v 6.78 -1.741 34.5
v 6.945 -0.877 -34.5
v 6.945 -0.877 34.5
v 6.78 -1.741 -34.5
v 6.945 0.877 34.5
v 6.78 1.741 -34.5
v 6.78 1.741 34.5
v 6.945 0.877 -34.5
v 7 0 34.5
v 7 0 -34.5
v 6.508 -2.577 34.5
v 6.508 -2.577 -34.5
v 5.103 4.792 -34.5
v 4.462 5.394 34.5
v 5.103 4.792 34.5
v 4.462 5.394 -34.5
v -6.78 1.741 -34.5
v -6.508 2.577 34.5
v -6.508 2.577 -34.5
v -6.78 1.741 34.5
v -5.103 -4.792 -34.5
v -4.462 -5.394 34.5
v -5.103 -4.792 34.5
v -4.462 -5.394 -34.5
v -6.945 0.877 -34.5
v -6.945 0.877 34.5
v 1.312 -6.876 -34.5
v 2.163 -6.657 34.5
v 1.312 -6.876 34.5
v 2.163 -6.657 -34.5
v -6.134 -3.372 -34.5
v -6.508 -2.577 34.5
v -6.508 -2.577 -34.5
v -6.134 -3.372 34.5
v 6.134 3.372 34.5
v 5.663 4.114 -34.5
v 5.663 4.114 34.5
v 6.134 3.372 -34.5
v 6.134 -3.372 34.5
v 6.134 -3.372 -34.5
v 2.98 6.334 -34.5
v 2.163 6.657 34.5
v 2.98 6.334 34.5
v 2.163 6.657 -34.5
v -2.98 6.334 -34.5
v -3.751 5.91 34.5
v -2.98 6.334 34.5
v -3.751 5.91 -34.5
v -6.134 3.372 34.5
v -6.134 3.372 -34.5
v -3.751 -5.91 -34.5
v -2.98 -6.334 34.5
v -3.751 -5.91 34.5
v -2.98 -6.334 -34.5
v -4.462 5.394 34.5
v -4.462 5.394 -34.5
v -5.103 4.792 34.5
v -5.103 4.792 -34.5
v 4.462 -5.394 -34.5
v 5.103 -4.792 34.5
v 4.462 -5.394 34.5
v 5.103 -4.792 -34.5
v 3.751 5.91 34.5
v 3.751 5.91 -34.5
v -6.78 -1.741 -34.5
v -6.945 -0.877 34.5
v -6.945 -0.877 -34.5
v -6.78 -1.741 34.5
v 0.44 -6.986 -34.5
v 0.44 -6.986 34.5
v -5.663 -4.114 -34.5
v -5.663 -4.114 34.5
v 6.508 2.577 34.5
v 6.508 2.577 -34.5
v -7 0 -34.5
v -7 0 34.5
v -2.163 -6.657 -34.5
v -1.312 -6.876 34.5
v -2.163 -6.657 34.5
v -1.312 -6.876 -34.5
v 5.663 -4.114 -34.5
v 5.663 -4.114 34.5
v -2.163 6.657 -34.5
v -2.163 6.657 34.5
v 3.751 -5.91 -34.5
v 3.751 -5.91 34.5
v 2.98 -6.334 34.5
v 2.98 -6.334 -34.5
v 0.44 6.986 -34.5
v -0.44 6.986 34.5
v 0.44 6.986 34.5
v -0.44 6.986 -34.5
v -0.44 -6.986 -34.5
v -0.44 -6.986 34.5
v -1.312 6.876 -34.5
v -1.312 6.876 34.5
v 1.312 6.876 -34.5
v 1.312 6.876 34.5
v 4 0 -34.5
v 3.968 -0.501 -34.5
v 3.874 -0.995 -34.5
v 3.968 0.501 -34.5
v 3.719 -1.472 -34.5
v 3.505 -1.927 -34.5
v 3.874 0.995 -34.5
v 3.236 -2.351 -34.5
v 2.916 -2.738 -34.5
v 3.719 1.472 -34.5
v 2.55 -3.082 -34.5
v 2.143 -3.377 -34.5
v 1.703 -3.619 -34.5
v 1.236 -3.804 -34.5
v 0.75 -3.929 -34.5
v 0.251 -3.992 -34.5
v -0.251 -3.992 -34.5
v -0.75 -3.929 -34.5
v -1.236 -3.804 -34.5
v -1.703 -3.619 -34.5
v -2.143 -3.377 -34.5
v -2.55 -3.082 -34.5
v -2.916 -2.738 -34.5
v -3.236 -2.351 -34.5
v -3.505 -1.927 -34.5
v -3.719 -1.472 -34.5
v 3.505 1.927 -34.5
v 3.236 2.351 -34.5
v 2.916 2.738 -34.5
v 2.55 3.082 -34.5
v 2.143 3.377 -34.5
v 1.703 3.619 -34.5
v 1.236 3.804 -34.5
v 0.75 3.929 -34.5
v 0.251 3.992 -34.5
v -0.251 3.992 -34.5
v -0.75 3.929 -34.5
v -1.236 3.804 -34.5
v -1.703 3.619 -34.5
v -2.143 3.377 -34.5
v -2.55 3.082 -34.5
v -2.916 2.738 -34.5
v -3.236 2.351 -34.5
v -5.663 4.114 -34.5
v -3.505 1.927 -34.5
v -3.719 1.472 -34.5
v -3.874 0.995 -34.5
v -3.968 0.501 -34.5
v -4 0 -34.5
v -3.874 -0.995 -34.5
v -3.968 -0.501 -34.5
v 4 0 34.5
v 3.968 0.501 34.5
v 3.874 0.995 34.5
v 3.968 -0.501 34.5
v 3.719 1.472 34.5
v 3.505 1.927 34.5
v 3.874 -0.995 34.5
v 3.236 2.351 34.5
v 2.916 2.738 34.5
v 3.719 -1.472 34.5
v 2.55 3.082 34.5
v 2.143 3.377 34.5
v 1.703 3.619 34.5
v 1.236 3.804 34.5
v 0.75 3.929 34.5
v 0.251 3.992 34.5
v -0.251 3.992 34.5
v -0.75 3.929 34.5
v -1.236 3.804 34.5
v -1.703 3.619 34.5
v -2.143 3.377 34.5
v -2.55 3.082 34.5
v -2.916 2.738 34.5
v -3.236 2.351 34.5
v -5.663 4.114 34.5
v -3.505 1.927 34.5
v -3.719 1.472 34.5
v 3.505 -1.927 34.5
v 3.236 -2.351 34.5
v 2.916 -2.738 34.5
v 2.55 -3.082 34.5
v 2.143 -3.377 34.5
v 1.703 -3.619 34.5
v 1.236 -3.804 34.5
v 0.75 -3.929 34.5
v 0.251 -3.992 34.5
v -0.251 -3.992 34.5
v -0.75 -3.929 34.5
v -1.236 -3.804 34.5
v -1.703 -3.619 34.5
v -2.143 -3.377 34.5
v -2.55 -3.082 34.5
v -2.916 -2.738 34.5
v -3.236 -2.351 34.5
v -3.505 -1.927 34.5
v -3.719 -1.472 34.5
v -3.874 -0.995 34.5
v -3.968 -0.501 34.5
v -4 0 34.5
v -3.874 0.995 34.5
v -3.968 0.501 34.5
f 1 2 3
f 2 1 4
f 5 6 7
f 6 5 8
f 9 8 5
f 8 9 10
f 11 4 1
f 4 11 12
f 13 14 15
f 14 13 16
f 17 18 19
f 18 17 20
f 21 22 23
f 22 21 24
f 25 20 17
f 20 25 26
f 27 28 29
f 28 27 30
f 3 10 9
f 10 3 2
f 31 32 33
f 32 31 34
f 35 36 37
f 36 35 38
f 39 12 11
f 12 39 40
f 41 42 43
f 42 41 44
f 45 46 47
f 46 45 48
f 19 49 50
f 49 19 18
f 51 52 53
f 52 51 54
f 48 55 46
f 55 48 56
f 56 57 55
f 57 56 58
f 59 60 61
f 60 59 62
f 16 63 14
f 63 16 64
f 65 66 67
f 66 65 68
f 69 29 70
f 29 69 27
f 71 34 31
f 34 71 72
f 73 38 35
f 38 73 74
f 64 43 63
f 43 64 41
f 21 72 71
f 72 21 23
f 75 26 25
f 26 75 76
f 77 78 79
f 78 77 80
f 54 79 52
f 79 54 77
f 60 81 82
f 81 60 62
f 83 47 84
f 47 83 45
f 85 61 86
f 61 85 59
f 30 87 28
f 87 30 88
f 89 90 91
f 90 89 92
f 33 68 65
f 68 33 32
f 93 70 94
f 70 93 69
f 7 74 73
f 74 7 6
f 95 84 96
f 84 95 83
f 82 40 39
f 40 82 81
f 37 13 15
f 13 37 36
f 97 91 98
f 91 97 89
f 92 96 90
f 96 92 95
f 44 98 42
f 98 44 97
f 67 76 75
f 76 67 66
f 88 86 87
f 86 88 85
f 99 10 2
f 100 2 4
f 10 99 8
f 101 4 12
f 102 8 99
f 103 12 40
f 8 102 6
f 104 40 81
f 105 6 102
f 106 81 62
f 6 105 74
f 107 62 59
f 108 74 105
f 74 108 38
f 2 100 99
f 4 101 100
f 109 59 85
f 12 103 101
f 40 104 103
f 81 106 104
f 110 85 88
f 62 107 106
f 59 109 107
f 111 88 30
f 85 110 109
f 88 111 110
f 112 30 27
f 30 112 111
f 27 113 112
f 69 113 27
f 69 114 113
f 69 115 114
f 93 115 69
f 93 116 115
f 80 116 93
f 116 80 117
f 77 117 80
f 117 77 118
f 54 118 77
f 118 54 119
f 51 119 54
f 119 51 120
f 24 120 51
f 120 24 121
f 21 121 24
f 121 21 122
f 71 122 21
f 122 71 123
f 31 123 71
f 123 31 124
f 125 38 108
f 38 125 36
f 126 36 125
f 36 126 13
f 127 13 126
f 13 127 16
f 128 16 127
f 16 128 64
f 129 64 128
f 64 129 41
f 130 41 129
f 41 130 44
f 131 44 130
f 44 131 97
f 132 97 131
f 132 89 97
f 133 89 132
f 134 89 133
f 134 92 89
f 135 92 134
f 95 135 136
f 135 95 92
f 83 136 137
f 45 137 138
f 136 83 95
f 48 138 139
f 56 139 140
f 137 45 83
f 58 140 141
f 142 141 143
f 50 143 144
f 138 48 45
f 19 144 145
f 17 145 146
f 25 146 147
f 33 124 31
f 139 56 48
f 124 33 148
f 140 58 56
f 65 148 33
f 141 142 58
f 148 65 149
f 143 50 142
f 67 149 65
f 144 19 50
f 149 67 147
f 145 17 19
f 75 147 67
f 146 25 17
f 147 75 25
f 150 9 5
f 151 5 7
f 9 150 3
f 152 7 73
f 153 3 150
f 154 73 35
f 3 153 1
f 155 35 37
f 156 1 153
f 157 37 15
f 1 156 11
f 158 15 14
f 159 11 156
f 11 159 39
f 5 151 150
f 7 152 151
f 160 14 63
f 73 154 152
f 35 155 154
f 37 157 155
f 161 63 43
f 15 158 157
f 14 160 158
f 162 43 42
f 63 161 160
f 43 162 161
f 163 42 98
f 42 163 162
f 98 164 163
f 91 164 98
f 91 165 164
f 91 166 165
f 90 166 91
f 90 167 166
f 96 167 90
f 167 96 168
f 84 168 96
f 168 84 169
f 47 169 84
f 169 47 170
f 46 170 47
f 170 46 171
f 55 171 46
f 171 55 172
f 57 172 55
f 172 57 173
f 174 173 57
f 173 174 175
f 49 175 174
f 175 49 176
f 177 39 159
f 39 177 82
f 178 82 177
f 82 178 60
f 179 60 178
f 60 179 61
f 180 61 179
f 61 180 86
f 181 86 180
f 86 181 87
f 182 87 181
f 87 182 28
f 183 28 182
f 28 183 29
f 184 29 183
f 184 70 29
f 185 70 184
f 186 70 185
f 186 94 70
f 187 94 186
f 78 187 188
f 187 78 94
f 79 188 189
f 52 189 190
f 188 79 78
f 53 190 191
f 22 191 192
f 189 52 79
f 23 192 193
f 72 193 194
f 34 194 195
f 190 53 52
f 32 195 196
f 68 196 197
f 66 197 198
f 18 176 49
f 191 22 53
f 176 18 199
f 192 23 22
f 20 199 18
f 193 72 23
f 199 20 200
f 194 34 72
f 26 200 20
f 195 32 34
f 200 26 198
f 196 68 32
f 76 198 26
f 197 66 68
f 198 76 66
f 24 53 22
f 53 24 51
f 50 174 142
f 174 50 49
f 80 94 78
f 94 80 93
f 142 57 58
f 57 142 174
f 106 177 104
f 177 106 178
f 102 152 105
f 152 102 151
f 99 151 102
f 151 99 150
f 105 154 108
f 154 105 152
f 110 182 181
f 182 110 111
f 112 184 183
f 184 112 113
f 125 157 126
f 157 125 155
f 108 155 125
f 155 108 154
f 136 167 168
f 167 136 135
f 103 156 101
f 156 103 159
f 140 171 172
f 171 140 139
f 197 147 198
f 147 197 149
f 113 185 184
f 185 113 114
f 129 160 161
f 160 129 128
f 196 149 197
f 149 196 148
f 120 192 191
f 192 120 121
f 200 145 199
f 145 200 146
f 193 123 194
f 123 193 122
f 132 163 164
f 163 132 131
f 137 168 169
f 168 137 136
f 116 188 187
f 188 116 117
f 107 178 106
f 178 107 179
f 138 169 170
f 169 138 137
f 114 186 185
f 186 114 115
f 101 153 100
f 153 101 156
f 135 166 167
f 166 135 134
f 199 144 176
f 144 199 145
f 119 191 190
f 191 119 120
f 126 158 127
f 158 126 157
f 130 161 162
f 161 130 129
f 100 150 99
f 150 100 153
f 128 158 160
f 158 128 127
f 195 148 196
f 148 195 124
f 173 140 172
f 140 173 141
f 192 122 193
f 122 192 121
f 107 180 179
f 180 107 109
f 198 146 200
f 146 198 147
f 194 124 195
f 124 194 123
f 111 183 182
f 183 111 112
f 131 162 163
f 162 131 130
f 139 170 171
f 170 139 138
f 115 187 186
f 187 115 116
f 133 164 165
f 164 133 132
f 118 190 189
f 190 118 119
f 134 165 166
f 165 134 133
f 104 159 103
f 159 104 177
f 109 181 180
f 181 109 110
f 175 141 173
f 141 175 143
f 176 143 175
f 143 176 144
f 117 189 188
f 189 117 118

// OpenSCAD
$fn = 50;


difference() {
	union() {
		translate(v = [0, 0, -34.5000000000]) {
			cylinder(h = 69, r = 7.0000000000);
		}
	}
	union() {
		translate(v = [0, 0, -100.0000000000]) {
			cylinder(h = 200, r = 4.0000000000);
		}
	}
}
